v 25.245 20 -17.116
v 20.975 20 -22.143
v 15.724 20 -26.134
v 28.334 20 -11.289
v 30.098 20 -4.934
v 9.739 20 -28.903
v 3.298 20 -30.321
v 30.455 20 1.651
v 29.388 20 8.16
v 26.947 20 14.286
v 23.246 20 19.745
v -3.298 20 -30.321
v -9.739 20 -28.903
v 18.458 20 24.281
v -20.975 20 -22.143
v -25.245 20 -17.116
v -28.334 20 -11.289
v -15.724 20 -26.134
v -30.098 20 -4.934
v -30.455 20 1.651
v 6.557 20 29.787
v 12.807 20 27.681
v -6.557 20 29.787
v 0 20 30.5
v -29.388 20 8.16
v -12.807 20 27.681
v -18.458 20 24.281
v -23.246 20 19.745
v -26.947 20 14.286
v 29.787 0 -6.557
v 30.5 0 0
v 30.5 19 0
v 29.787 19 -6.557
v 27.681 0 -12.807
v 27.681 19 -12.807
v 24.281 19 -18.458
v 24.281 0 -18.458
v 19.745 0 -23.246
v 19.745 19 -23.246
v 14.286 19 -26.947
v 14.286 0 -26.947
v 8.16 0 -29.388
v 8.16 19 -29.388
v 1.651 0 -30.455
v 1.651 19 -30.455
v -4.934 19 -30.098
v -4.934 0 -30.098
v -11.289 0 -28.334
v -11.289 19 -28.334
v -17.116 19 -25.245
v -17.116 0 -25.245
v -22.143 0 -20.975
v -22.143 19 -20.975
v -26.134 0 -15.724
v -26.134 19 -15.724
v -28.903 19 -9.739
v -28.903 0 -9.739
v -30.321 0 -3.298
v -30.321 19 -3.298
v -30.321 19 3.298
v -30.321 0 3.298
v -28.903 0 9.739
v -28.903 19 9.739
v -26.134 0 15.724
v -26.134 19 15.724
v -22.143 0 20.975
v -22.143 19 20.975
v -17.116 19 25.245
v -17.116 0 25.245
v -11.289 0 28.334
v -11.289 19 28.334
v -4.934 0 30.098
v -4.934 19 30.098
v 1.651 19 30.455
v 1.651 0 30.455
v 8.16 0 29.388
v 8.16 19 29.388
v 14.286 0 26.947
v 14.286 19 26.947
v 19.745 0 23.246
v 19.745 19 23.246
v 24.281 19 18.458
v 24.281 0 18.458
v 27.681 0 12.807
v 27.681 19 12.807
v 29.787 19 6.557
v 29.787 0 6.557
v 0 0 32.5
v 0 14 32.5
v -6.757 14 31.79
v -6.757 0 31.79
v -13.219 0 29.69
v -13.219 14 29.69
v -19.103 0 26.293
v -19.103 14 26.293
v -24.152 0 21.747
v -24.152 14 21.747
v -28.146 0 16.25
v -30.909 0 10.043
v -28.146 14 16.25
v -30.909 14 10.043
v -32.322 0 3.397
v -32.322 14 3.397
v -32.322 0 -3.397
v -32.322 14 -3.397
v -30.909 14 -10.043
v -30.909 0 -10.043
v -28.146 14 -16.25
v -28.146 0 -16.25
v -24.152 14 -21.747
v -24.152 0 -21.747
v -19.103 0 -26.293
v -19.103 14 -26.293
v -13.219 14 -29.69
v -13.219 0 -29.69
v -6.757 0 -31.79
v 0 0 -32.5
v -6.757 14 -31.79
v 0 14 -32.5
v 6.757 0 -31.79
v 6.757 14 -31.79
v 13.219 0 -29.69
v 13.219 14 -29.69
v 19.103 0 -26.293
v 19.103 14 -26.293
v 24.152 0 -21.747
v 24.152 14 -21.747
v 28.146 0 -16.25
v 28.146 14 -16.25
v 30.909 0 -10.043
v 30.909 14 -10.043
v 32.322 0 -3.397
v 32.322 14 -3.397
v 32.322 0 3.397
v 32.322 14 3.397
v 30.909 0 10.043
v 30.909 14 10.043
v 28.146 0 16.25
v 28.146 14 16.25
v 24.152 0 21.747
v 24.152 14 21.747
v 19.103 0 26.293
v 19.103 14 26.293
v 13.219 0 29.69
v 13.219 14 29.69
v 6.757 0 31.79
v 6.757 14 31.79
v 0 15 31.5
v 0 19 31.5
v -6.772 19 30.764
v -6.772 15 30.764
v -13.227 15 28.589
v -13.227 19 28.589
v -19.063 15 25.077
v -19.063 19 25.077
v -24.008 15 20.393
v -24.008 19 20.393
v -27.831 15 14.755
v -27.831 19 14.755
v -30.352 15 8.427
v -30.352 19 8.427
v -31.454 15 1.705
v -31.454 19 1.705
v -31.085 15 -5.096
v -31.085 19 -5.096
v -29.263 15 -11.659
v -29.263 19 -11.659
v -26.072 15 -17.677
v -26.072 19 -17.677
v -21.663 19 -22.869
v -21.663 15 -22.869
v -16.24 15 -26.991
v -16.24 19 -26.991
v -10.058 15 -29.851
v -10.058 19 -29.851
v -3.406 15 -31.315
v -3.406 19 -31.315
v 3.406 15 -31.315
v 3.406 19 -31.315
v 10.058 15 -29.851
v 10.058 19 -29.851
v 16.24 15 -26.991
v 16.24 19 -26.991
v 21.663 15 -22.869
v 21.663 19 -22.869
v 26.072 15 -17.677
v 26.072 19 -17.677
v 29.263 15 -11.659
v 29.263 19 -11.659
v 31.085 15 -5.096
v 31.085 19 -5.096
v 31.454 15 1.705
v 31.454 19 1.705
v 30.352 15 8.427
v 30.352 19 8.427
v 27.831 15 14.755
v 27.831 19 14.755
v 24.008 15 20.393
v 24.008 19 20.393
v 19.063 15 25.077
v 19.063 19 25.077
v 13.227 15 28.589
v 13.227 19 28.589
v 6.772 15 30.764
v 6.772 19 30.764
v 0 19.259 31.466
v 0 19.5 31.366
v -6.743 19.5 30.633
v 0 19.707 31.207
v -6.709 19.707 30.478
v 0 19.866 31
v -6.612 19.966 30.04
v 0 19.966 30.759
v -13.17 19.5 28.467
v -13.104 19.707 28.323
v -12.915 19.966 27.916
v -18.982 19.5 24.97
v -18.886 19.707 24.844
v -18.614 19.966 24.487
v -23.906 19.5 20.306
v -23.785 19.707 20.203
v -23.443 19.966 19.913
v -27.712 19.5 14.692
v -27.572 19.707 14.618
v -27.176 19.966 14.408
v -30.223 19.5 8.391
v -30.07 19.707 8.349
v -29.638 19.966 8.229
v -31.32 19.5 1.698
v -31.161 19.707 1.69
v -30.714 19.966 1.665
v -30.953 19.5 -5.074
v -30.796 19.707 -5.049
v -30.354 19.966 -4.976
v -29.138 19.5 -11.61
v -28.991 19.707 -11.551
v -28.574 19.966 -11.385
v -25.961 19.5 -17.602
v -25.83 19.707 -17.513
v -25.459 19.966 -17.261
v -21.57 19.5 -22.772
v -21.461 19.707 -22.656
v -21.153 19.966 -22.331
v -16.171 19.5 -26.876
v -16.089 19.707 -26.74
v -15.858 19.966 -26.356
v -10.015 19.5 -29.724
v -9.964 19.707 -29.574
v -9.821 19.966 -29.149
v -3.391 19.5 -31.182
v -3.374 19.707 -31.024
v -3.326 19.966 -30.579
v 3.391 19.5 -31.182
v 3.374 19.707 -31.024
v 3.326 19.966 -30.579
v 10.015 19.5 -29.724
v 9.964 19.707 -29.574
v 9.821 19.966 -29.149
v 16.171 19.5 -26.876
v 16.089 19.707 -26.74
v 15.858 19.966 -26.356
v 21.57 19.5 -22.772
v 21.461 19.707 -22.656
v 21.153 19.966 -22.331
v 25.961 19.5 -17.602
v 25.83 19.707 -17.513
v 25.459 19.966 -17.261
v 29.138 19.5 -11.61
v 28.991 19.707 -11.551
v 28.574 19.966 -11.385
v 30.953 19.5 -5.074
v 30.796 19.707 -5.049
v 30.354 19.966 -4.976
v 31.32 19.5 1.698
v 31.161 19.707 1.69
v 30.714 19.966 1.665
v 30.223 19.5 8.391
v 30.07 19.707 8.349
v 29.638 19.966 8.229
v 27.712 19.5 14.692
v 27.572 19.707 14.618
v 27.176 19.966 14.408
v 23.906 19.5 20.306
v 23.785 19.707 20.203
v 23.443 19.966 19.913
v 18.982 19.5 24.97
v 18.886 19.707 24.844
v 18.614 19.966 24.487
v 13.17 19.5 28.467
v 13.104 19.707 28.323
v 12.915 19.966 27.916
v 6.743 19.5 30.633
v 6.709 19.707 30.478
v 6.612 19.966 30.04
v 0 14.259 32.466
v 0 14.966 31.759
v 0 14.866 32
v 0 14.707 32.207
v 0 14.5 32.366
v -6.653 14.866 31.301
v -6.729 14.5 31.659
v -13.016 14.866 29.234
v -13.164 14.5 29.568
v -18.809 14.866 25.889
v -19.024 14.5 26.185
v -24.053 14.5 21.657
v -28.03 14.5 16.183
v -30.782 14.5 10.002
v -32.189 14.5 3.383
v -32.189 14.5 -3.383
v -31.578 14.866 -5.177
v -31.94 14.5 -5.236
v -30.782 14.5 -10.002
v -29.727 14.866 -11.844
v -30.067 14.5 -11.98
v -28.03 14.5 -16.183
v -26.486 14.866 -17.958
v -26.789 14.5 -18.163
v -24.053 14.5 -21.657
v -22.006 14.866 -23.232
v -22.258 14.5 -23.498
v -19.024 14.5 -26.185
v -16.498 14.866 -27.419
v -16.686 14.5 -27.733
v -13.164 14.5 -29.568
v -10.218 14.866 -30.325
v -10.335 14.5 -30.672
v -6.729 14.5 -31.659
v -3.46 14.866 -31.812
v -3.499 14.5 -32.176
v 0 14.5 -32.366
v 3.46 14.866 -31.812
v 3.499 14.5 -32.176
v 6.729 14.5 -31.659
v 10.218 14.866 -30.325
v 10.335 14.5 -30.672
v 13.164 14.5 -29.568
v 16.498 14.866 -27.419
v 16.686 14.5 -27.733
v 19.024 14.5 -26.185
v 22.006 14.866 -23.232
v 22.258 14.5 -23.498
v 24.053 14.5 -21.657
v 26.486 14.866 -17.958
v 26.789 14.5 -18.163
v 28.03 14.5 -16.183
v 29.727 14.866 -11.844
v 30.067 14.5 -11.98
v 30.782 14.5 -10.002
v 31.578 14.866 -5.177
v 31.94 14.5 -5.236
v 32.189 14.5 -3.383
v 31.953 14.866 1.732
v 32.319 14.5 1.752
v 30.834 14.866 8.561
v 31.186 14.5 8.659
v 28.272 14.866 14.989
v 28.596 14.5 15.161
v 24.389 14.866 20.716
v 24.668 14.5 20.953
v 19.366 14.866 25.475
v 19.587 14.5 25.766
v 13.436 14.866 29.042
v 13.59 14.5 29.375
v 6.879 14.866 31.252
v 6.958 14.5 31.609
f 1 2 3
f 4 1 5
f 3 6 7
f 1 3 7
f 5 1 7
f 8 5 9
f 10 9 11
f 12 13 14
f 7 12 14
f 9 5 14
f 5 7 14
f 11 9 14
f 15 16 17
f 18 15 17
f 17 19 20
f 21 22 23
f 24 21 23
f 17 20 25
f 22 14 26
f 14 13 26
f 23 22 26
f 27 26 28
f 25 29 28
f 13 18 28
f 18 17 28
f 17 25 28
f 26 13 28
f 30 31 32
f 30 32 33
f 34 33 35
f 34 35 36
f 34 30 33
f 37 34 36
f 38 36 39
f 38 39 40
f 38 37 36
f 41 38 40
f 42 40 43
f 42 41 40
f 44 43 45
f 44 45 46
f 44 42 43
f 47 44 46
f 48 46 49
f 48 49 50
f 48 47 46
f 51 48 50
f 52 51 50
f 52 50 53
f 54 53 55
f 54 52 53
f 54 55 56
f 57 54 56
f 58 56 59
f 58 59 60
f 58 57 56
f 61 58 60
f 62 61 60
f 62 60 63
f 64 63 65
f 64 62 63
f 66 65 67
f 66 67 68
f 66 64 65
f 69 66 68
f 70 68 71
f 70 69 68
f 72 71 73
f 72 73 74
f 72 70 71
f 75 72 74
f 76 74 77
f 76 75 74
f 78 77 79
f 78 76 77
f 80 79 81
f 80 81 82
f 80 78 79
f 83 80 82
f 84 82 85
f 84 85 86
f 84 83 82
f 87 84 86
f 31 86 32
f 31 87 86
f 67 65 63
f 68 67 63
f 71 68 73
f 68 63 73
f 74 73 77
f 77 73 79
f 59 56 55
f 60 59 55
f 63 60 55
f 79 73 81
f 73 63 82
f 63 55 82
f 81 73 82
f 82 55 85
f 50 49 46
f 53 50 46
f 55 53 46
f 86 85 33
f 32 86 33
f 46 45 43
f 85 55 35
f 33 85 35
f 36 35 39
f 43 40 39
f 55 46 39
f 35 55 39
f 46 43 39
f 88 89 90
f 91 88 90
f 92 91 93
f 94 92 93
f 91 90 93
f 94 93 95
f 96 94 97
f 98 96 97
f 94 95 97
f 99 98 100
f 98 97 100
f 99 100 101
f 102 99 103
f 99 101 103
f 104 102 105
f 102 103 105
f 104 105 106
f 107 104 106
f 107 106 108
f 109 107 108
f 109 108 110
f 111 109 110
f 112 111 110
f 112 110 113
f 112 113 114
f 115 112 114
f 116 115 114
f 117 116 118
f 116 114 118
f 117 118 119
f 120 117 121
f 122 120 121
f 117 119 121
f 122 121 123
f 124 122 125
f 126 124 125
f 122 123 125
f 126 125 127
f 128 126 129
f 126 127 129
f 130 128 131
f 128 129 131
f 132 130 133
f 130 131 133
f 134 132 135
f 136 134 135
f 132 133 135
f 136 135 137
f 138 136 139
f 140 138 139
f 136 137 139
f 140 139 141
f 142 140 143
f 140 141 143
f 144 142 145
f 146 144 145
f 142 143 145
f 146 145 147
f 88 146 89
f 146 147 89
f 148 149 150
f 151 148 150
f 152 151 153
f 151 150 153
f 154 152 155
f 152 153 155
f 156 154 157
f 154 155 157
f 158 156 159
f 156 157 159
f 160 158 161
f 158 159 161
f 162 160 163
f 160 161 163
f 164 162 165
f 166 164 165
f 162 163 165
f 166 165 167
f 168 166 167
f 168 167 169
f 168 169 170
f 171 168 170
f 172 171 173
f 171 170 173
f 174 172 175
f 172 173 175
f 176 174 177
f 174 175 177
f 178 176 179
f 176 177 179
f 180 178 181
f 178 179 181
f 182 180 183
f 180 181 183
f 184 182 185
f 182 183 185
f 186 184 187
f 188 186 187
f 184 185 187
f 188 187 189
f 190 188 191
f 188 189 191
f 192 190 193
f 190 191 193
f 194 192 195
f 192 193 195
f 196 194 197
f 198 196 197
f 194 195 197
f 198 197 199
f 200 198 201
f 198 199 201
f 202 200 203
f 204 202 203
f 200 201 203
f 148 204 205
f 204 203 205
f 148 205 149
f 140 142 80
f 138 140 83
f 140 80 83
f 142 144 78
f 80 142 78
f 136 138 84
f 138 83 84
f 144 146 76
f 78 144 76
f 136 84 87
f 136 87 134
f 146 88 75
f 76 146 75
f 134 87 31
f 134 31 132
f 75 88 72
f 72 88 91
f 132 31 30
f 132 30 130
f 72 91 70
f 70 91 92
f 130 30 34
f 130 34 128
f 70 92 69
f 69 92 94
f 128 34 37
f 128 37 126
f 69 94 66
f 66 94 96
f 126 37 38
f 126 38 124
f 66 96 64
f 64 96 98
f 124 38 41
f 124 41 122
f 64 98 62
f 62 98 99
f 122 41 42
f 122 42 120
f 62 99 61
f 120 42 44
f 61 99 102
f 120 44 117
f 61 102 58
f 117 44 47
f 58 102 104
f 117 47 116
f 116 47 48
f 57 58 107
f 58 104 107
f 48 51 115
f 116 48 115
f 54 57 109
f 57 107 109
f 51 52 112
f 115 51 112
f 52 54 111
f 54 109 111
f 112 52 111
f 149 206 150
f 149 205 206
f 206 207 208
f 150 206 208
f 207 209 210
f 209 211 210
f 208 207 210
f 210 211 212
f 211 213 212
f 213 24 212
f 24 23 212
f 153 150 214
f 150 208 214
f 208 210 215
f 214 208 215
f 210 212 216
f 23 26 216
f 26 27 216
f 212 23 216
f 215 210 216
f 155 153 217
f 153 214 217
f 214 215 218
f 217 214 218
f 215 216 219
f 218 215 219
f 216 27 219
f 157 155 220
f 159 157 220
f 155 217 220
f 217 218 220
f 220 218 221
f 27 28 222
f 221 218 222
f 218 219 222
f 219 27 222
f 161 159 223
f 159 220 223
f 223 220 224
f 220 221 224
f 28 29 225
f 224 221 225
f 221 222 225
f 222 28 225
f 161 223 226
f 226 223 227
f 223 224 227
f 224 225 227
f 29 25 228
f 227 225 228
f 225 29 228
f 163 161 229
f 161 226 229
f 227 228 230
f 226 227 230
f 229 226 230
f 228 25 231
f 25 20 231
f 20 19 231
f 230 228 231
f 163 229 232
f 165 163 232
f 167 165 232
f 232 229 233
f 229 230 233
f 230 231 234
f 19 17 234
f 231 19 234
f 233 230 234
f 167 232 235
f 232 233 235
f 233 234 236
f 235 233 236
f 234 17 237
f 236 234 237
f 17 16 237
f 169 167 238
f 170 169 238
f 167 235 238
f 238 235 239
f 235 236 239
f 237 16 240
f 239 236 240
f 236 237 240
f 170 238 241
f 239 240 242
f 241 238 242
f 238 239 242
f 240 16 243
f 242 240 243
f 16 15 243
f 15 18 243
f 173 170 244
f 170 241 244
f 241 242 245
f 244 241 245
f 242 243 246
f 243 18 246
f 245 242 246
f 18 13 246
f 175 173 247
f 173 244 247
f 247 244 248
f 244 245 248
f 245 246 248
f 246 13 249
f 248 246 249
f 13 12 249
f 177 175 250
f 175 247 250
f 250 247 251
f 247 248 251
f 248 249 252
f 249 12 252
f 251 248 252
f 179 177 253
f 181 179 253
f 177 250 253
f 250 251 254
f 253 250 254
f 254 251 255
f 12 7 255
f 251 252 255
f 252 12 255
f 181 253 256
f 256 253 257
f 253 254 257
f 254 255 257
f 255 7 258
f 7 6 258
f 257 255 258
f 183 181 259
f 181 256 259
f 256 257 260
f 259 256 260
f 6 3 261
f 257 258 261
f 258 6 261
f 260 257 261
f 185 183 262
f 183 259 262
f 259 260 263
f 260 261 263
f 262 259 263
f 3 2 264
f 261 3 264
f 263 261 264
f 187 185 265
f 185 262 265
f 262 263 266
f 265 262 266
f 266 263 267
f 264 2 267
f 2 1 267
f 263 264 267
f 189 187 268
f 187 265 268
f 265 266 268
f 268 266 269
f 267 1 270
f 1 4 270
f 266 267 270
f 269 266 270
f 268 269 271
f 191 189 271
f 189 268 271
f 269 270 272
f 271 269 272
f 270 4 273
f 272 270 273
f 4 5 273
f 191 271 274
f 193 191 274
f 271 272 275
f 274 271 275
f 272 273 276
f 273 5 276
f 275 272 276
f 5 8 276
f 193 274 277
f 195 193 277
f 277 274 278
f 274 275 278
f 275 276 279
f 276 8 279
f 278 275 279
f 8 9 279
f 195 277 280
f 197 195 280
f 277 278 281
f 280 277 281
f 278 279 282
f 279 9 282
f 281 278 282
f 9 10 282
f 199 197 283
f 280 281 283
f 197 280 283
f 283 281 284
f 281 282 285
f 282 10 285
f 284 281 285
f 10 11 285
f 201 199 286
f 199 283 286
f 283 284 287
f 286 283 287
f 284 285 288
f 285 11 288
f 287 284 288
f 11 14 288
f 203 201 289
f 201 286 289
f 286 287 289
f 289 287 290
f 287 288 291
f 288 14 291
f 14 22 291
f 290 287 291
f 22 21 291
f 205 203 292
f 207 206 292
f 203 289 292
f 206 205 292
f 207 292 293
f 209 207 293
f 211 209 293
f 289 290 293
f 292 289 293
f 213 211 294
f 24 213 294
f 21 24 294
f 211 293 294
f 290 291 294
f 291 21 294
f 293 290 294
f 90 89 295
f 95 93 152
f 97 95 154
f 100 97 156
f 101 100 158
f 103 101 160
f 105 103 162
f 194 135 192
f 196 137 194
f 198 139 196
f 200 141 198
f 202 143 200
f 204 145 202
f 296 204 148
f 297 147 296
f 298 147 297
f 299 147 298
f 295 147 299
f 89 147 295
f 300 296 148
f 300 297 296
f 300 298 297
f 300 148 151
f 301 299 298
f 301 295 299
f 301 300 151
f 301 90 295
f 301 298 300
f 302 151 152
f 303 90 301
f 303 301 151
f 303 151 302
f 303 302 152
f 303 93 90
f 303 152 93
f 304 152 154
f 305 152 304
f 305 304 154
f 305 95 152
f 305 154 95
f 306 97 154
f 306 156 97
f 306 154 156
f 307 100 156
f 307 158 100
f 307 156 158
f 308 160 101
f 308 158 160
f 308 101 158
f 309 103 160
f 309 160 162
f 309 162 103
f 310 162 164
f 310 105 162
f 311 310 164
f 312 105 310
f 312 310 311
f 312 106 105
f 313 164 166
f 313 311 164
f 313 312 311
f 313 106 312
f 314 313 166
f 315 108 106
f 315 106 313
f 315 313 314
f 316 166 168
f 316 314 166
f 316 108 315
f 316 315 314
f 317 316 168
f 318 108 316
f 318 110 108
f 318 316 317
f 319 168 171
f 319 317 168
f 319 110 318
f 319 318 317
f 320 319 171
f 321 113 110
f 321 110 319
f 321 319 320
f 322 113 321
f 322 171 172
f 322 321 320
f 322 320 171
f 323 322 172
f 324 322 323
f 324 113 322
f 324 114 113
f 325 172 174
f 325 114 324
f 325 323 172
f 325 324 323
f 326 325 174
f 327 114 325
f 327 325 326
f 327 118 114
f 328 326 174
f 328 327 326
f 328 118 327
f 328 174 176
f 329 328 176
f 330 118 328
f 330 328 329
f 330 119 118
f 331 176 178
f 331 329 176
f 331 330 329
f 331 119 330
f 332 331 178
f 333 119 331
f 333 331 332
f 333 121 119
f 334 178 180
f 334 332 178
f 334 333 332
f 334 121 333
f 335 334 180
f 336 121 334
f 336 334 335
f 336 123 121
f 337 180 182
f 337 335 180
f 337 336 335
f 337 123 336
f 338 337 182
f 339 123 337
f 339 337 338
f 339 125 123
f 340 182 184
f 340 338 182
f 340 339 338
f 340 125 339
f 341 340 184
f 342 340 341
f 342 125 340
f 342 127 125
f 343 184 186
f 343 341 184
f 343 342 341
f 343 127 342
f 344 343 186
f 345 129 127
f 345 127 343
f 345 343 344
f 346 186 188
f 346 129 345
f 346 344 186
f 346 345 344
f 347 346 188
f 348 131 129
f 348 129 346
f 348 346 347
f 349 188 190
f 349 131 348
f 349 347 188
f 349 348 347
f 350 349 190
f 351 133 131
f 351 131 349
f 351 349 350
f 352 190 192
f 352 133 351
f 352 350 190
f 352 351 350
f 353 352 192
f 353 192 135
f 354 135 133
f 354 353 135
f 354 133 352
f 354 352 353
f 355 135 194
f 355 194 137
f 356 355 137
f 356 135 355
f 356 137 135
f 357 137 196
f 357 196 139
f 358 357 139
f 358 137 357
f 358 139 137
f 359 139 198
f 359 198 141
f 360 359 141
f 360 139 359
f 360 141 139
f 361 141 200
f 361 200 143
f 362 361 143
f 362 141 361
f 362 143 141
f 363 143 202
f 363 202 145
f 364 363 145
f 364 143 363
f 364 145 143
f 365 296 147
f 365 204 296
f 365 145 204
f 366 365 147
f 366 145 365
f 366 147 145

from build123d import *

# Parameters (mm, degrees)
CONG_1_R         = 1
CONG_2_R         = 1
COQUE3_OUTLINE_R = 30.5
COQUE3_DEPTH     = 19


# Read off the part's stored shape, not the designer's step: Coque3
with BuildPart() as part:
    # Esquisse1 → Révolution1 (revolve)
    with BuildSketch(Plane.XY, mode=Mode.PRIVATE) as r_volution1_sk:
        Polygon((0, 0), (32.5, 0), (32.5, 15), (31.5, 15), (31.5, 20), (0, 20), align=None)
    revolve(r_volution1_sk.sketch.rotate(Axis((0, 0, 0), (0, -1, 0)), 90), axis=Axis((0, 0, 0), (0, -1, 0)))

    # Congé1
    cong_1_edges = [part.edges().sort_by_distance(p)[0] for p in [
        (0, 20, -31.5),
    ]]
    fillet(cong_1_edges, radius=CONG_1_R)

    # Congé2
    cong_2_edges = [part.edges().sort_by_distance(p)[0] for p in [
        (0, 15, -32.5),
    ]]
    fillet(cong_2_edges, radius=CONG_2_R - 0.0001)  # a hair under: the kernel refuses the full size

    # Coque3 outline → Coque3 (cut)
    with BuildSketch(Plane(origin=(0, 0, 0), x_dir=(1, 0, 0), z_dir=(0, 1, 0))):
        Circle(COQUE3_OUTLINE_R)
    extrude(amount=COQUE3_DEPTH, mode=Mode.SUBTRACT)


solid = part.part
